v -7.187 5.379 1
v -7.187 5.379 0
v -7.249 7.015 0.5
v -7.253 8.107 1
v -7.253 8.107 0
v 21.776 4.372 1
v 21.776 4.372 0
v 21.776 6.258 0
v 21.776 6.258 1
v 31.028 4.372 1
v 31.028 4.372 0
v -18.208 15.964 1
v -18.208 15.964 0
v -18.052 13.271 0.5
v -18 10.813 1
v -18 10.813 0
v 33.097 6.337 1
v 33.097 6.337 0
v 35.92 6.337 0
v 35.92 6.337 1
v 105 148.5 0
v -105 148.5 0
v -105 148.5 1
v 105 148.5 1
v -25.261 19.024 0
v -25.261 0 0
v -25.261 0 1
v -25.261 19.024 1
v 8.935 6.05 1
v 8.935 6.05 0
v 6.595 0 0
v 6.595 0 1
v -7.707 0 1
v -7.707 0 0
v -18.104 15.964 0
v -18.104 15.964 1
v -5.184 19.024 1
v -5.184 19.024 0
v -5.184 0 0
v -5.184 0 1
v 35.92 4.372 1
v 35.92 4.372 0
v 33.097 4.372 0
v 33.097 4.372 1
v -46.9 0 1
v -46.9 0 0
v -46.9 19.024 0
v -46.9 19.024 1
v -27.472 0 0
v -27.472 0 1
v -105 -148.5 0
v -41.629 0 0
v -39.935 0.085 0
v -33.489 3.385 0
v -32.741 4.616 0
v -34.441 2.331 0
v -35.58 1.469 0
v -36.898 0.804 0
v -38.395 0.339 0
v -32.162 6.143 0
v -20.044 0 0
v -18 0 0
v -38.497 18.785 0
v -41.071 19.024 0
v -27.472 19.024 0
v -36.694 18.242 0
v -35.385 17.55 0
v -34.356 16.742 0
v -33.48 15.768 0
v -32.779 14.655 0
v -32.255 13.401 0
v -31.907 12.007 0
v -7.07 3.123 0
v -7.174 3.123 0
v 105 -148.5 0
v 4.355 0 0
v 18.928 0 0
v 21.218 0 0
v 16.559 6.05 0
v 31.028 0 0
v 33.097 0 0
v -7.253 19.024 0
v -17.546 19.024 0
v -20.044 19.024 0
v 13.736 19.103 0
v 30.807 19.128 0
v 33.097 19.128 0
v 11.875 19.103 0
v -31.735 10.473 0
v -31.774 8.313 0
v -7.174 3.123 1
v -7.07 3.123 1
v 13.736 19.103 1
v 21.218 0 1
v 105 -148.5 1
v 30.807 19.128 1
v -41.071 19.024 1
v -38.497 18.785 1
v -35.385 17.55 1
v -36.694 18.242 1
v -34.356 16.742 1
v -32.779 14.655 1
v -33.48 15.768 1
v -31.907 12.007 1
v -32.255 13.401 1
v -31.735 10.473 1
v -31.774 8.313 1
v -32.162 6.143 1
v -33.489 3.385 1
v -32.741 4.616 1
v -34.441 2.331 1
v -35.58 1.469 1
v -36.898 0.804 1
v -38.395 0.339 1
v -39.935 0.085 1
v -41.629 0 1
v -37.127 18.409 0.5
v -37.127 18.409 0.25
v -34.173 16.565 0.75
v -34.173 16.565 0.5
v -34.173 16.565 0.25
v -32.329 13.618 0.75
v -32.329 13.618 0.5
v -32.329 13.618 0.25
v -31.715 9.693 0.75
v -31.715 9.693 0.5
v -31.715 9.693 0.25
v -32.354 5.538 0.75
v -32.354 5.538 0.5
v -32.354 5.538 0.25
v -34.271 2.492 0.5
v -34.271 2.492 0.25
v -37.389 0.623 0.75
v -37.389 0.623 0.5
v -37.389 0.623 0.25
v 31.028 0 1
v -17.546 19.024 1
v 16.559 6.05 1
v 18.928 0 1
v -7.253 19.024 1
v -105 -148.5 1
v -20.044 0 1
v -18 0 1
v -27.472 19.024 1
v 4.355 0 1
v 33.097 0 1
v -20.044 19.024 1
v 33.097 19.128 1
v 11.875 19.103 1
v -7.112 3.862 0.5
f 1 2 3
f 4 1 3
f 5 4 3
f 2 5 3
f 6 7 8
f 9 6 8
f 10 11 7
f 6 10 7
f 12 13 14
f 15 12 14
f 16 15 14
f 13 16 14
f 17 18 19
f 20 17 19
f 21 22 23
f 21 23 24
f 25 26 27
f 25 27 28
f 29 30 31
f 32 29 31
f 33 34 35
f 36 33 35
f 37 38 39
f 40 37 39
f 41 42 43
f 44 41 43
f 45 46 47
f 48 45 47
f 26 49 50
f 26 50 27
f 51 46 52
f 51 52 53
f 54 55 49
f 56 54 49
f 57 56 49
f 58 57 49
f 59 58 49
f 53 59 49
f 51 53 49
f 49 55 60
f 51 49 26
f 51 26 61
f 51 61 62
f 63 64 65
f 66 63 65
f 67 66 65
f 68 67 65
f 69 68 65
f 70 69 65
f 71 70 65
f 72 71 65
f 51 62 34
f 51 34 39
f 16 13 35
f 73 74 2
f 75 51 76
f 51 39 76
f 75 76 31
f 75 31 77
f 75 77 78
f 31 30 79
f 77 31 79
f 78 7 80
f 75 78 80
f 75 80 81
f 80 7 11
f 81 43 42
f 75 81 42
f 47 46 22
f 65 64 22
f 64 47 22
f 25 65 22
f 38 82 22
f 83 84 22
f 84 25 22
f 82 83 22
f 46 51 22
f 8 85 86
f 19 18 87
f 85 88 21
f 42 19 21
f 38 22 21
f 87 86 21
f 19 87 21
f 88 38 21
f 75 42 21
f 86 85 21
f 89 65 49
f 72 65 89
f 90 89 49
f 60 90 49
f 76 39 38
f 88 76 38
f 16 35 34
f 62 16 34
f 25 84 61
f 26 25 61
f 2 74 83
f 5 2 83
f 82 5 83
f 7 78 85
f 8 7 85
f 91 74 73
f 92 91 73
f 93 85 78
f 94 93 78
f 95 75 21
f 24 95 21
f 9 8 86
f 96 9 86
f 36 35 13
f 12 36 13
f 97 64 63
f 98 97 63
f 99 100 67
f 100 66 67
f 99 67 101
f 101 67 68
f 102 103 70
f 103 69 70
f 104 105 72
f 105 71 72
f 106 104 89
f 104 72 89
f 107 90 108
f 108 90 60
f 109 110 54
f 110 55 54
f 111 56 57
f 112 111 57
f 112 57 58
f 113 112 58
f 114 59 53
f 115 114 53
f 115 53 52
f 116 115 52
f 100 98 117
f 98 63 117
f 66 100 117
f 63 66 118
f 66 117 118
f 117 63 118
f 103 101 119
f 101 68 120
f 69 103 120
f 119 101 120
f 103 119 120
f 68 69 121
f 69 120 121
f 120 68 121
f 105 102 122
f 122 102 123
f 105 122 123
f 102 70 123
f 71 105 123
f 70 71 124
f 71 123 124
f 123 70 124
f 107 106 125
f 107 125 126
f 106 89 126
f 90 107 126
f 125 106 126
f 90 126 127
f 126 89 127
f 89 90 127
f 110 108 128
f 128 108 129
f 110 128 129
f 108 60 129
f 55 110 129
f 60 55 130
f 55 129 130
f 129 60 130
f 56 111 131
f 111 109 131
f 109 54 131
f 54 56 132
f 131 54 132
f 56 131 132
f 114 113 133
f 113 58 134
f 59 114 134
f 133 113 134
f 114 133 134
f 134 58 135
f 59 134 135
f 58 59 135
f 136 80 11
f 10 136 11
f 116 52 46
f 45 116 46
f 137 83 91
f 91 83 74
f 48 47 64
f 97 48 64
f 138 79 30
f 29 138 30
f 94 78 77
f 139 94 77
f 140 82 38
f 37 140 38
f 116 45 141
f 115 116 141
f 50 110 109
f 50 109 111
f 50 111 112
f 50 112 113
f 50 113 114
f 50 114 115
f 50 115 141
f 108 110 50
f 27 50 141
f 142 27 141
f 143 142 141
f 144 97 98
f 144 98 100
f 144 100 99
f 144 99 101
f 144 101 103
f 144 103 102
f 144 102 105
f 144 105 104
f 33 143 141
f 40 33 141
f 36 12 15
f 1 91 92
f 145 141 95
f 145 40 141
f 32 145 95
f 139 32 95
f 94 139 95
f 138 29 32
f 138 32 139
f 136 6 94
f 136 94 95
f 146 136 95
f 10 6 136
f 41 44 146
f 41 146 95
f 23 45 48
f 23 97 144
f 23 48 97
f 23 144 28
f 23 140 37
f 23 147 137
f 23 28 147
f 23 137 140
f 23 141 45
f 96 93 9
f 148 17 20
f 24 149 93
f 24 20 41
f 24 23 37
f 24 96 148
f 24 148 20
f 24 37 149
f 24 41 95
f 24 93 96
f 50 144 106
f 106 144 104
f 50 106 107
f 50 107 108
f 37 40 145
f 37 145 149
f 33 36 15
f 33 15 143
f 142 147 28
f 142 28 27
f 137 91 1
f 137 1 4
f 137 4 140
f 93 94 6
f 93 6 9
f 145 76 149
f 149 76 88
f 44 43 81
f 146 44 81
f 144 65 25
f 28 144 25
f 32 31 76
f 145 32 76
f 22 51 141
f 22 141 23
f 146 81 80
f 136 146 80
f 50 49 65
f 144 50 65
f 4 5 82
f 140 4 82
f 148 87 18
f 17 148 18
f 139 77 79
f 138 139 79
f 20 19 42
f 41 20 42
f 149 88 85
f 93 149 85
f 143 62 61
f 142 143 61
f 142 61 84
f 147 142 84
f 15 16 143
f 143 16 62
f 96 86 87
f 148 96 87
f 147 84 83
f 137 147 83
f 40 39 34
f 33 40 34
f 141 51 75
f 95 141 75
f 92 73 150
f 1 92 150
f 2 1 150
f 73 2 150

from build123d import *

# Parameters (mm, degrees)
F0_W     = 210
F0_H     = 297
F0_W_2   = 2.2109179881
F0_H_2   = 19.0238875475
F1_DEPTH = 1


with BuildPart() as f1:
    # F0 (on Top) → F1 (new body)
    with BuildSketch(Plane.XY):
        Rectangle(F0_W, F0_H)
        with BuildLine():
            add(Edge.make_bspline(
                [(-34.1734707151, 16.5652301615), (-31.714813329, 14.1065727754), (-31.714813329, 9.6930641739)],
                knots=[0, 0, 0, 1, 1, 1], degree=2))
            add(Edge.make_bspline(
                [(-31.714813329, 9.6930641739), (-31.714813329, 4.9839337698), (-34.271317368, 2.4919668849)],
                knots=[0, 0, 0, 1, 1, 1], degree=2))
            add(Edge.make_bspline(
                [(-34.271317368, 2.4919668849), (-36.827821407, 0), (-41.628552933, 0)],
                knots=[0, 0, 0, 1, 1, 1], degree=2))
            Line((-41.628552933, 0), (-46.8997811307, 0))
            Line((-46.8997811307, 0), (-46.8997811307, 19.0238875475))
            Line((-46.8997811307, 19.0238875475), (-41.0706188268, 19.0238875475))
            add(Edge.make_bspline(
                [(-41.0706188268, 19.0238875475), (-36.6321281011, 19.0238875475), (-34.1734707151, 16.5652301615)],
                knots=[0, 0, 0, 1, 1, 1], degree=2))
        make_face(mode=Mode.SUBTRACT)
        with Locations((-26.3665569152, 9.5119437738)):
            Rectangle(F0_W_2, F0_H_2, mode=Mode.SUBTRACT)
        with BuildLine():
            Line((-5.1837974715, 19.0238875475), (-5.1837974715, 0))
            Line((-5.1837974715, 0), (-7.7069920117, 0))
            Line((-7.7069920117, 0), (-18.1037193494, 15.963577338))
            Line((-18.1037193494, 15.963577338), (-18.2078115334, 15.963577338))
            add(Edge.make_bspline(
                [(-18.2078115334, 15.963577338), (-17.9996271654, 13.15308837), (-17.9996271654, 10.8130960737)],
                knots=[0, 0, 0, 1, 1, 1], degree=2))
            Line((-17.9996271654, 10.8130960737), (-17.9996271654, 0))
            Line((-17.9996271654, 0), (-20.0439976591, 0))
            Line((-20.0439976591, 0), (-20.0439976591, 19.0238875475))
            Line((-20.0439976591, 19.0238875475), (-17.5457852432, 19.0238875475))
            Line((-17.5457852432, 19.0238875475), (-7.1740400296, 3.1227655199))
            Line((-7.1740400296, 3.1227655199), (-7.0699478456, 3.1227655199))
            add(Edge.make_bspline(
                [(-7.0699478456, 3.1227655199), (-7.0949299698, 3.4725152582), (-7.1865310917, 5.379484069)],
                knots=[0, 0, 0, 1, 1, 1], degree=2))
            add(Edge.make_bspline(
                [(-7.1865310917, 5.379484069), (-7.2781322136, 7.2864528799), (-7.2531500894, 8.1066992898)],
                knots=[0, 0, 0, 1, 1, 1], degree=2))
            Line((-7.2531500894, 8.1066992898), (-7.2531500894, 19.0238875475))
            Line((-7.2531500894, 19.0238875475), (-5.1837974715, 19.0238875475))
        make_face(mode=Mode.SUBTRACT)
        Polygon((21.2181440778, 0), (18.9281160298, 0), (16.558977922, 6.049837734), (8.935266366, 6.049837734), (6.5952740697, 0), (4.3552102701, 0), (11.8748296421, 19.1029976074), (13.735997892, 19.1029976074), align=None, mode=Mode.SUBTRACT)
        Polygon((35.9201241457, 6.3371321618), (35.9201241457, 4.3718717279), (33.0971441156, 4.3718717279), (33.0971441156, 0), (31.0277914978, 0), (31.0277914978, 4.3718717279), (21.776078184, 4.3718717279), (21.776078184, 6.258022102), (30.8071160677, 19.1279797315), (33.0971441156, 19.1279797315), (33.0971441156, 6.3371321618), align=None, mode=Mode.SUBTRACT)
    extrude(amount=F1_DEPTH)


solid = f1.part
